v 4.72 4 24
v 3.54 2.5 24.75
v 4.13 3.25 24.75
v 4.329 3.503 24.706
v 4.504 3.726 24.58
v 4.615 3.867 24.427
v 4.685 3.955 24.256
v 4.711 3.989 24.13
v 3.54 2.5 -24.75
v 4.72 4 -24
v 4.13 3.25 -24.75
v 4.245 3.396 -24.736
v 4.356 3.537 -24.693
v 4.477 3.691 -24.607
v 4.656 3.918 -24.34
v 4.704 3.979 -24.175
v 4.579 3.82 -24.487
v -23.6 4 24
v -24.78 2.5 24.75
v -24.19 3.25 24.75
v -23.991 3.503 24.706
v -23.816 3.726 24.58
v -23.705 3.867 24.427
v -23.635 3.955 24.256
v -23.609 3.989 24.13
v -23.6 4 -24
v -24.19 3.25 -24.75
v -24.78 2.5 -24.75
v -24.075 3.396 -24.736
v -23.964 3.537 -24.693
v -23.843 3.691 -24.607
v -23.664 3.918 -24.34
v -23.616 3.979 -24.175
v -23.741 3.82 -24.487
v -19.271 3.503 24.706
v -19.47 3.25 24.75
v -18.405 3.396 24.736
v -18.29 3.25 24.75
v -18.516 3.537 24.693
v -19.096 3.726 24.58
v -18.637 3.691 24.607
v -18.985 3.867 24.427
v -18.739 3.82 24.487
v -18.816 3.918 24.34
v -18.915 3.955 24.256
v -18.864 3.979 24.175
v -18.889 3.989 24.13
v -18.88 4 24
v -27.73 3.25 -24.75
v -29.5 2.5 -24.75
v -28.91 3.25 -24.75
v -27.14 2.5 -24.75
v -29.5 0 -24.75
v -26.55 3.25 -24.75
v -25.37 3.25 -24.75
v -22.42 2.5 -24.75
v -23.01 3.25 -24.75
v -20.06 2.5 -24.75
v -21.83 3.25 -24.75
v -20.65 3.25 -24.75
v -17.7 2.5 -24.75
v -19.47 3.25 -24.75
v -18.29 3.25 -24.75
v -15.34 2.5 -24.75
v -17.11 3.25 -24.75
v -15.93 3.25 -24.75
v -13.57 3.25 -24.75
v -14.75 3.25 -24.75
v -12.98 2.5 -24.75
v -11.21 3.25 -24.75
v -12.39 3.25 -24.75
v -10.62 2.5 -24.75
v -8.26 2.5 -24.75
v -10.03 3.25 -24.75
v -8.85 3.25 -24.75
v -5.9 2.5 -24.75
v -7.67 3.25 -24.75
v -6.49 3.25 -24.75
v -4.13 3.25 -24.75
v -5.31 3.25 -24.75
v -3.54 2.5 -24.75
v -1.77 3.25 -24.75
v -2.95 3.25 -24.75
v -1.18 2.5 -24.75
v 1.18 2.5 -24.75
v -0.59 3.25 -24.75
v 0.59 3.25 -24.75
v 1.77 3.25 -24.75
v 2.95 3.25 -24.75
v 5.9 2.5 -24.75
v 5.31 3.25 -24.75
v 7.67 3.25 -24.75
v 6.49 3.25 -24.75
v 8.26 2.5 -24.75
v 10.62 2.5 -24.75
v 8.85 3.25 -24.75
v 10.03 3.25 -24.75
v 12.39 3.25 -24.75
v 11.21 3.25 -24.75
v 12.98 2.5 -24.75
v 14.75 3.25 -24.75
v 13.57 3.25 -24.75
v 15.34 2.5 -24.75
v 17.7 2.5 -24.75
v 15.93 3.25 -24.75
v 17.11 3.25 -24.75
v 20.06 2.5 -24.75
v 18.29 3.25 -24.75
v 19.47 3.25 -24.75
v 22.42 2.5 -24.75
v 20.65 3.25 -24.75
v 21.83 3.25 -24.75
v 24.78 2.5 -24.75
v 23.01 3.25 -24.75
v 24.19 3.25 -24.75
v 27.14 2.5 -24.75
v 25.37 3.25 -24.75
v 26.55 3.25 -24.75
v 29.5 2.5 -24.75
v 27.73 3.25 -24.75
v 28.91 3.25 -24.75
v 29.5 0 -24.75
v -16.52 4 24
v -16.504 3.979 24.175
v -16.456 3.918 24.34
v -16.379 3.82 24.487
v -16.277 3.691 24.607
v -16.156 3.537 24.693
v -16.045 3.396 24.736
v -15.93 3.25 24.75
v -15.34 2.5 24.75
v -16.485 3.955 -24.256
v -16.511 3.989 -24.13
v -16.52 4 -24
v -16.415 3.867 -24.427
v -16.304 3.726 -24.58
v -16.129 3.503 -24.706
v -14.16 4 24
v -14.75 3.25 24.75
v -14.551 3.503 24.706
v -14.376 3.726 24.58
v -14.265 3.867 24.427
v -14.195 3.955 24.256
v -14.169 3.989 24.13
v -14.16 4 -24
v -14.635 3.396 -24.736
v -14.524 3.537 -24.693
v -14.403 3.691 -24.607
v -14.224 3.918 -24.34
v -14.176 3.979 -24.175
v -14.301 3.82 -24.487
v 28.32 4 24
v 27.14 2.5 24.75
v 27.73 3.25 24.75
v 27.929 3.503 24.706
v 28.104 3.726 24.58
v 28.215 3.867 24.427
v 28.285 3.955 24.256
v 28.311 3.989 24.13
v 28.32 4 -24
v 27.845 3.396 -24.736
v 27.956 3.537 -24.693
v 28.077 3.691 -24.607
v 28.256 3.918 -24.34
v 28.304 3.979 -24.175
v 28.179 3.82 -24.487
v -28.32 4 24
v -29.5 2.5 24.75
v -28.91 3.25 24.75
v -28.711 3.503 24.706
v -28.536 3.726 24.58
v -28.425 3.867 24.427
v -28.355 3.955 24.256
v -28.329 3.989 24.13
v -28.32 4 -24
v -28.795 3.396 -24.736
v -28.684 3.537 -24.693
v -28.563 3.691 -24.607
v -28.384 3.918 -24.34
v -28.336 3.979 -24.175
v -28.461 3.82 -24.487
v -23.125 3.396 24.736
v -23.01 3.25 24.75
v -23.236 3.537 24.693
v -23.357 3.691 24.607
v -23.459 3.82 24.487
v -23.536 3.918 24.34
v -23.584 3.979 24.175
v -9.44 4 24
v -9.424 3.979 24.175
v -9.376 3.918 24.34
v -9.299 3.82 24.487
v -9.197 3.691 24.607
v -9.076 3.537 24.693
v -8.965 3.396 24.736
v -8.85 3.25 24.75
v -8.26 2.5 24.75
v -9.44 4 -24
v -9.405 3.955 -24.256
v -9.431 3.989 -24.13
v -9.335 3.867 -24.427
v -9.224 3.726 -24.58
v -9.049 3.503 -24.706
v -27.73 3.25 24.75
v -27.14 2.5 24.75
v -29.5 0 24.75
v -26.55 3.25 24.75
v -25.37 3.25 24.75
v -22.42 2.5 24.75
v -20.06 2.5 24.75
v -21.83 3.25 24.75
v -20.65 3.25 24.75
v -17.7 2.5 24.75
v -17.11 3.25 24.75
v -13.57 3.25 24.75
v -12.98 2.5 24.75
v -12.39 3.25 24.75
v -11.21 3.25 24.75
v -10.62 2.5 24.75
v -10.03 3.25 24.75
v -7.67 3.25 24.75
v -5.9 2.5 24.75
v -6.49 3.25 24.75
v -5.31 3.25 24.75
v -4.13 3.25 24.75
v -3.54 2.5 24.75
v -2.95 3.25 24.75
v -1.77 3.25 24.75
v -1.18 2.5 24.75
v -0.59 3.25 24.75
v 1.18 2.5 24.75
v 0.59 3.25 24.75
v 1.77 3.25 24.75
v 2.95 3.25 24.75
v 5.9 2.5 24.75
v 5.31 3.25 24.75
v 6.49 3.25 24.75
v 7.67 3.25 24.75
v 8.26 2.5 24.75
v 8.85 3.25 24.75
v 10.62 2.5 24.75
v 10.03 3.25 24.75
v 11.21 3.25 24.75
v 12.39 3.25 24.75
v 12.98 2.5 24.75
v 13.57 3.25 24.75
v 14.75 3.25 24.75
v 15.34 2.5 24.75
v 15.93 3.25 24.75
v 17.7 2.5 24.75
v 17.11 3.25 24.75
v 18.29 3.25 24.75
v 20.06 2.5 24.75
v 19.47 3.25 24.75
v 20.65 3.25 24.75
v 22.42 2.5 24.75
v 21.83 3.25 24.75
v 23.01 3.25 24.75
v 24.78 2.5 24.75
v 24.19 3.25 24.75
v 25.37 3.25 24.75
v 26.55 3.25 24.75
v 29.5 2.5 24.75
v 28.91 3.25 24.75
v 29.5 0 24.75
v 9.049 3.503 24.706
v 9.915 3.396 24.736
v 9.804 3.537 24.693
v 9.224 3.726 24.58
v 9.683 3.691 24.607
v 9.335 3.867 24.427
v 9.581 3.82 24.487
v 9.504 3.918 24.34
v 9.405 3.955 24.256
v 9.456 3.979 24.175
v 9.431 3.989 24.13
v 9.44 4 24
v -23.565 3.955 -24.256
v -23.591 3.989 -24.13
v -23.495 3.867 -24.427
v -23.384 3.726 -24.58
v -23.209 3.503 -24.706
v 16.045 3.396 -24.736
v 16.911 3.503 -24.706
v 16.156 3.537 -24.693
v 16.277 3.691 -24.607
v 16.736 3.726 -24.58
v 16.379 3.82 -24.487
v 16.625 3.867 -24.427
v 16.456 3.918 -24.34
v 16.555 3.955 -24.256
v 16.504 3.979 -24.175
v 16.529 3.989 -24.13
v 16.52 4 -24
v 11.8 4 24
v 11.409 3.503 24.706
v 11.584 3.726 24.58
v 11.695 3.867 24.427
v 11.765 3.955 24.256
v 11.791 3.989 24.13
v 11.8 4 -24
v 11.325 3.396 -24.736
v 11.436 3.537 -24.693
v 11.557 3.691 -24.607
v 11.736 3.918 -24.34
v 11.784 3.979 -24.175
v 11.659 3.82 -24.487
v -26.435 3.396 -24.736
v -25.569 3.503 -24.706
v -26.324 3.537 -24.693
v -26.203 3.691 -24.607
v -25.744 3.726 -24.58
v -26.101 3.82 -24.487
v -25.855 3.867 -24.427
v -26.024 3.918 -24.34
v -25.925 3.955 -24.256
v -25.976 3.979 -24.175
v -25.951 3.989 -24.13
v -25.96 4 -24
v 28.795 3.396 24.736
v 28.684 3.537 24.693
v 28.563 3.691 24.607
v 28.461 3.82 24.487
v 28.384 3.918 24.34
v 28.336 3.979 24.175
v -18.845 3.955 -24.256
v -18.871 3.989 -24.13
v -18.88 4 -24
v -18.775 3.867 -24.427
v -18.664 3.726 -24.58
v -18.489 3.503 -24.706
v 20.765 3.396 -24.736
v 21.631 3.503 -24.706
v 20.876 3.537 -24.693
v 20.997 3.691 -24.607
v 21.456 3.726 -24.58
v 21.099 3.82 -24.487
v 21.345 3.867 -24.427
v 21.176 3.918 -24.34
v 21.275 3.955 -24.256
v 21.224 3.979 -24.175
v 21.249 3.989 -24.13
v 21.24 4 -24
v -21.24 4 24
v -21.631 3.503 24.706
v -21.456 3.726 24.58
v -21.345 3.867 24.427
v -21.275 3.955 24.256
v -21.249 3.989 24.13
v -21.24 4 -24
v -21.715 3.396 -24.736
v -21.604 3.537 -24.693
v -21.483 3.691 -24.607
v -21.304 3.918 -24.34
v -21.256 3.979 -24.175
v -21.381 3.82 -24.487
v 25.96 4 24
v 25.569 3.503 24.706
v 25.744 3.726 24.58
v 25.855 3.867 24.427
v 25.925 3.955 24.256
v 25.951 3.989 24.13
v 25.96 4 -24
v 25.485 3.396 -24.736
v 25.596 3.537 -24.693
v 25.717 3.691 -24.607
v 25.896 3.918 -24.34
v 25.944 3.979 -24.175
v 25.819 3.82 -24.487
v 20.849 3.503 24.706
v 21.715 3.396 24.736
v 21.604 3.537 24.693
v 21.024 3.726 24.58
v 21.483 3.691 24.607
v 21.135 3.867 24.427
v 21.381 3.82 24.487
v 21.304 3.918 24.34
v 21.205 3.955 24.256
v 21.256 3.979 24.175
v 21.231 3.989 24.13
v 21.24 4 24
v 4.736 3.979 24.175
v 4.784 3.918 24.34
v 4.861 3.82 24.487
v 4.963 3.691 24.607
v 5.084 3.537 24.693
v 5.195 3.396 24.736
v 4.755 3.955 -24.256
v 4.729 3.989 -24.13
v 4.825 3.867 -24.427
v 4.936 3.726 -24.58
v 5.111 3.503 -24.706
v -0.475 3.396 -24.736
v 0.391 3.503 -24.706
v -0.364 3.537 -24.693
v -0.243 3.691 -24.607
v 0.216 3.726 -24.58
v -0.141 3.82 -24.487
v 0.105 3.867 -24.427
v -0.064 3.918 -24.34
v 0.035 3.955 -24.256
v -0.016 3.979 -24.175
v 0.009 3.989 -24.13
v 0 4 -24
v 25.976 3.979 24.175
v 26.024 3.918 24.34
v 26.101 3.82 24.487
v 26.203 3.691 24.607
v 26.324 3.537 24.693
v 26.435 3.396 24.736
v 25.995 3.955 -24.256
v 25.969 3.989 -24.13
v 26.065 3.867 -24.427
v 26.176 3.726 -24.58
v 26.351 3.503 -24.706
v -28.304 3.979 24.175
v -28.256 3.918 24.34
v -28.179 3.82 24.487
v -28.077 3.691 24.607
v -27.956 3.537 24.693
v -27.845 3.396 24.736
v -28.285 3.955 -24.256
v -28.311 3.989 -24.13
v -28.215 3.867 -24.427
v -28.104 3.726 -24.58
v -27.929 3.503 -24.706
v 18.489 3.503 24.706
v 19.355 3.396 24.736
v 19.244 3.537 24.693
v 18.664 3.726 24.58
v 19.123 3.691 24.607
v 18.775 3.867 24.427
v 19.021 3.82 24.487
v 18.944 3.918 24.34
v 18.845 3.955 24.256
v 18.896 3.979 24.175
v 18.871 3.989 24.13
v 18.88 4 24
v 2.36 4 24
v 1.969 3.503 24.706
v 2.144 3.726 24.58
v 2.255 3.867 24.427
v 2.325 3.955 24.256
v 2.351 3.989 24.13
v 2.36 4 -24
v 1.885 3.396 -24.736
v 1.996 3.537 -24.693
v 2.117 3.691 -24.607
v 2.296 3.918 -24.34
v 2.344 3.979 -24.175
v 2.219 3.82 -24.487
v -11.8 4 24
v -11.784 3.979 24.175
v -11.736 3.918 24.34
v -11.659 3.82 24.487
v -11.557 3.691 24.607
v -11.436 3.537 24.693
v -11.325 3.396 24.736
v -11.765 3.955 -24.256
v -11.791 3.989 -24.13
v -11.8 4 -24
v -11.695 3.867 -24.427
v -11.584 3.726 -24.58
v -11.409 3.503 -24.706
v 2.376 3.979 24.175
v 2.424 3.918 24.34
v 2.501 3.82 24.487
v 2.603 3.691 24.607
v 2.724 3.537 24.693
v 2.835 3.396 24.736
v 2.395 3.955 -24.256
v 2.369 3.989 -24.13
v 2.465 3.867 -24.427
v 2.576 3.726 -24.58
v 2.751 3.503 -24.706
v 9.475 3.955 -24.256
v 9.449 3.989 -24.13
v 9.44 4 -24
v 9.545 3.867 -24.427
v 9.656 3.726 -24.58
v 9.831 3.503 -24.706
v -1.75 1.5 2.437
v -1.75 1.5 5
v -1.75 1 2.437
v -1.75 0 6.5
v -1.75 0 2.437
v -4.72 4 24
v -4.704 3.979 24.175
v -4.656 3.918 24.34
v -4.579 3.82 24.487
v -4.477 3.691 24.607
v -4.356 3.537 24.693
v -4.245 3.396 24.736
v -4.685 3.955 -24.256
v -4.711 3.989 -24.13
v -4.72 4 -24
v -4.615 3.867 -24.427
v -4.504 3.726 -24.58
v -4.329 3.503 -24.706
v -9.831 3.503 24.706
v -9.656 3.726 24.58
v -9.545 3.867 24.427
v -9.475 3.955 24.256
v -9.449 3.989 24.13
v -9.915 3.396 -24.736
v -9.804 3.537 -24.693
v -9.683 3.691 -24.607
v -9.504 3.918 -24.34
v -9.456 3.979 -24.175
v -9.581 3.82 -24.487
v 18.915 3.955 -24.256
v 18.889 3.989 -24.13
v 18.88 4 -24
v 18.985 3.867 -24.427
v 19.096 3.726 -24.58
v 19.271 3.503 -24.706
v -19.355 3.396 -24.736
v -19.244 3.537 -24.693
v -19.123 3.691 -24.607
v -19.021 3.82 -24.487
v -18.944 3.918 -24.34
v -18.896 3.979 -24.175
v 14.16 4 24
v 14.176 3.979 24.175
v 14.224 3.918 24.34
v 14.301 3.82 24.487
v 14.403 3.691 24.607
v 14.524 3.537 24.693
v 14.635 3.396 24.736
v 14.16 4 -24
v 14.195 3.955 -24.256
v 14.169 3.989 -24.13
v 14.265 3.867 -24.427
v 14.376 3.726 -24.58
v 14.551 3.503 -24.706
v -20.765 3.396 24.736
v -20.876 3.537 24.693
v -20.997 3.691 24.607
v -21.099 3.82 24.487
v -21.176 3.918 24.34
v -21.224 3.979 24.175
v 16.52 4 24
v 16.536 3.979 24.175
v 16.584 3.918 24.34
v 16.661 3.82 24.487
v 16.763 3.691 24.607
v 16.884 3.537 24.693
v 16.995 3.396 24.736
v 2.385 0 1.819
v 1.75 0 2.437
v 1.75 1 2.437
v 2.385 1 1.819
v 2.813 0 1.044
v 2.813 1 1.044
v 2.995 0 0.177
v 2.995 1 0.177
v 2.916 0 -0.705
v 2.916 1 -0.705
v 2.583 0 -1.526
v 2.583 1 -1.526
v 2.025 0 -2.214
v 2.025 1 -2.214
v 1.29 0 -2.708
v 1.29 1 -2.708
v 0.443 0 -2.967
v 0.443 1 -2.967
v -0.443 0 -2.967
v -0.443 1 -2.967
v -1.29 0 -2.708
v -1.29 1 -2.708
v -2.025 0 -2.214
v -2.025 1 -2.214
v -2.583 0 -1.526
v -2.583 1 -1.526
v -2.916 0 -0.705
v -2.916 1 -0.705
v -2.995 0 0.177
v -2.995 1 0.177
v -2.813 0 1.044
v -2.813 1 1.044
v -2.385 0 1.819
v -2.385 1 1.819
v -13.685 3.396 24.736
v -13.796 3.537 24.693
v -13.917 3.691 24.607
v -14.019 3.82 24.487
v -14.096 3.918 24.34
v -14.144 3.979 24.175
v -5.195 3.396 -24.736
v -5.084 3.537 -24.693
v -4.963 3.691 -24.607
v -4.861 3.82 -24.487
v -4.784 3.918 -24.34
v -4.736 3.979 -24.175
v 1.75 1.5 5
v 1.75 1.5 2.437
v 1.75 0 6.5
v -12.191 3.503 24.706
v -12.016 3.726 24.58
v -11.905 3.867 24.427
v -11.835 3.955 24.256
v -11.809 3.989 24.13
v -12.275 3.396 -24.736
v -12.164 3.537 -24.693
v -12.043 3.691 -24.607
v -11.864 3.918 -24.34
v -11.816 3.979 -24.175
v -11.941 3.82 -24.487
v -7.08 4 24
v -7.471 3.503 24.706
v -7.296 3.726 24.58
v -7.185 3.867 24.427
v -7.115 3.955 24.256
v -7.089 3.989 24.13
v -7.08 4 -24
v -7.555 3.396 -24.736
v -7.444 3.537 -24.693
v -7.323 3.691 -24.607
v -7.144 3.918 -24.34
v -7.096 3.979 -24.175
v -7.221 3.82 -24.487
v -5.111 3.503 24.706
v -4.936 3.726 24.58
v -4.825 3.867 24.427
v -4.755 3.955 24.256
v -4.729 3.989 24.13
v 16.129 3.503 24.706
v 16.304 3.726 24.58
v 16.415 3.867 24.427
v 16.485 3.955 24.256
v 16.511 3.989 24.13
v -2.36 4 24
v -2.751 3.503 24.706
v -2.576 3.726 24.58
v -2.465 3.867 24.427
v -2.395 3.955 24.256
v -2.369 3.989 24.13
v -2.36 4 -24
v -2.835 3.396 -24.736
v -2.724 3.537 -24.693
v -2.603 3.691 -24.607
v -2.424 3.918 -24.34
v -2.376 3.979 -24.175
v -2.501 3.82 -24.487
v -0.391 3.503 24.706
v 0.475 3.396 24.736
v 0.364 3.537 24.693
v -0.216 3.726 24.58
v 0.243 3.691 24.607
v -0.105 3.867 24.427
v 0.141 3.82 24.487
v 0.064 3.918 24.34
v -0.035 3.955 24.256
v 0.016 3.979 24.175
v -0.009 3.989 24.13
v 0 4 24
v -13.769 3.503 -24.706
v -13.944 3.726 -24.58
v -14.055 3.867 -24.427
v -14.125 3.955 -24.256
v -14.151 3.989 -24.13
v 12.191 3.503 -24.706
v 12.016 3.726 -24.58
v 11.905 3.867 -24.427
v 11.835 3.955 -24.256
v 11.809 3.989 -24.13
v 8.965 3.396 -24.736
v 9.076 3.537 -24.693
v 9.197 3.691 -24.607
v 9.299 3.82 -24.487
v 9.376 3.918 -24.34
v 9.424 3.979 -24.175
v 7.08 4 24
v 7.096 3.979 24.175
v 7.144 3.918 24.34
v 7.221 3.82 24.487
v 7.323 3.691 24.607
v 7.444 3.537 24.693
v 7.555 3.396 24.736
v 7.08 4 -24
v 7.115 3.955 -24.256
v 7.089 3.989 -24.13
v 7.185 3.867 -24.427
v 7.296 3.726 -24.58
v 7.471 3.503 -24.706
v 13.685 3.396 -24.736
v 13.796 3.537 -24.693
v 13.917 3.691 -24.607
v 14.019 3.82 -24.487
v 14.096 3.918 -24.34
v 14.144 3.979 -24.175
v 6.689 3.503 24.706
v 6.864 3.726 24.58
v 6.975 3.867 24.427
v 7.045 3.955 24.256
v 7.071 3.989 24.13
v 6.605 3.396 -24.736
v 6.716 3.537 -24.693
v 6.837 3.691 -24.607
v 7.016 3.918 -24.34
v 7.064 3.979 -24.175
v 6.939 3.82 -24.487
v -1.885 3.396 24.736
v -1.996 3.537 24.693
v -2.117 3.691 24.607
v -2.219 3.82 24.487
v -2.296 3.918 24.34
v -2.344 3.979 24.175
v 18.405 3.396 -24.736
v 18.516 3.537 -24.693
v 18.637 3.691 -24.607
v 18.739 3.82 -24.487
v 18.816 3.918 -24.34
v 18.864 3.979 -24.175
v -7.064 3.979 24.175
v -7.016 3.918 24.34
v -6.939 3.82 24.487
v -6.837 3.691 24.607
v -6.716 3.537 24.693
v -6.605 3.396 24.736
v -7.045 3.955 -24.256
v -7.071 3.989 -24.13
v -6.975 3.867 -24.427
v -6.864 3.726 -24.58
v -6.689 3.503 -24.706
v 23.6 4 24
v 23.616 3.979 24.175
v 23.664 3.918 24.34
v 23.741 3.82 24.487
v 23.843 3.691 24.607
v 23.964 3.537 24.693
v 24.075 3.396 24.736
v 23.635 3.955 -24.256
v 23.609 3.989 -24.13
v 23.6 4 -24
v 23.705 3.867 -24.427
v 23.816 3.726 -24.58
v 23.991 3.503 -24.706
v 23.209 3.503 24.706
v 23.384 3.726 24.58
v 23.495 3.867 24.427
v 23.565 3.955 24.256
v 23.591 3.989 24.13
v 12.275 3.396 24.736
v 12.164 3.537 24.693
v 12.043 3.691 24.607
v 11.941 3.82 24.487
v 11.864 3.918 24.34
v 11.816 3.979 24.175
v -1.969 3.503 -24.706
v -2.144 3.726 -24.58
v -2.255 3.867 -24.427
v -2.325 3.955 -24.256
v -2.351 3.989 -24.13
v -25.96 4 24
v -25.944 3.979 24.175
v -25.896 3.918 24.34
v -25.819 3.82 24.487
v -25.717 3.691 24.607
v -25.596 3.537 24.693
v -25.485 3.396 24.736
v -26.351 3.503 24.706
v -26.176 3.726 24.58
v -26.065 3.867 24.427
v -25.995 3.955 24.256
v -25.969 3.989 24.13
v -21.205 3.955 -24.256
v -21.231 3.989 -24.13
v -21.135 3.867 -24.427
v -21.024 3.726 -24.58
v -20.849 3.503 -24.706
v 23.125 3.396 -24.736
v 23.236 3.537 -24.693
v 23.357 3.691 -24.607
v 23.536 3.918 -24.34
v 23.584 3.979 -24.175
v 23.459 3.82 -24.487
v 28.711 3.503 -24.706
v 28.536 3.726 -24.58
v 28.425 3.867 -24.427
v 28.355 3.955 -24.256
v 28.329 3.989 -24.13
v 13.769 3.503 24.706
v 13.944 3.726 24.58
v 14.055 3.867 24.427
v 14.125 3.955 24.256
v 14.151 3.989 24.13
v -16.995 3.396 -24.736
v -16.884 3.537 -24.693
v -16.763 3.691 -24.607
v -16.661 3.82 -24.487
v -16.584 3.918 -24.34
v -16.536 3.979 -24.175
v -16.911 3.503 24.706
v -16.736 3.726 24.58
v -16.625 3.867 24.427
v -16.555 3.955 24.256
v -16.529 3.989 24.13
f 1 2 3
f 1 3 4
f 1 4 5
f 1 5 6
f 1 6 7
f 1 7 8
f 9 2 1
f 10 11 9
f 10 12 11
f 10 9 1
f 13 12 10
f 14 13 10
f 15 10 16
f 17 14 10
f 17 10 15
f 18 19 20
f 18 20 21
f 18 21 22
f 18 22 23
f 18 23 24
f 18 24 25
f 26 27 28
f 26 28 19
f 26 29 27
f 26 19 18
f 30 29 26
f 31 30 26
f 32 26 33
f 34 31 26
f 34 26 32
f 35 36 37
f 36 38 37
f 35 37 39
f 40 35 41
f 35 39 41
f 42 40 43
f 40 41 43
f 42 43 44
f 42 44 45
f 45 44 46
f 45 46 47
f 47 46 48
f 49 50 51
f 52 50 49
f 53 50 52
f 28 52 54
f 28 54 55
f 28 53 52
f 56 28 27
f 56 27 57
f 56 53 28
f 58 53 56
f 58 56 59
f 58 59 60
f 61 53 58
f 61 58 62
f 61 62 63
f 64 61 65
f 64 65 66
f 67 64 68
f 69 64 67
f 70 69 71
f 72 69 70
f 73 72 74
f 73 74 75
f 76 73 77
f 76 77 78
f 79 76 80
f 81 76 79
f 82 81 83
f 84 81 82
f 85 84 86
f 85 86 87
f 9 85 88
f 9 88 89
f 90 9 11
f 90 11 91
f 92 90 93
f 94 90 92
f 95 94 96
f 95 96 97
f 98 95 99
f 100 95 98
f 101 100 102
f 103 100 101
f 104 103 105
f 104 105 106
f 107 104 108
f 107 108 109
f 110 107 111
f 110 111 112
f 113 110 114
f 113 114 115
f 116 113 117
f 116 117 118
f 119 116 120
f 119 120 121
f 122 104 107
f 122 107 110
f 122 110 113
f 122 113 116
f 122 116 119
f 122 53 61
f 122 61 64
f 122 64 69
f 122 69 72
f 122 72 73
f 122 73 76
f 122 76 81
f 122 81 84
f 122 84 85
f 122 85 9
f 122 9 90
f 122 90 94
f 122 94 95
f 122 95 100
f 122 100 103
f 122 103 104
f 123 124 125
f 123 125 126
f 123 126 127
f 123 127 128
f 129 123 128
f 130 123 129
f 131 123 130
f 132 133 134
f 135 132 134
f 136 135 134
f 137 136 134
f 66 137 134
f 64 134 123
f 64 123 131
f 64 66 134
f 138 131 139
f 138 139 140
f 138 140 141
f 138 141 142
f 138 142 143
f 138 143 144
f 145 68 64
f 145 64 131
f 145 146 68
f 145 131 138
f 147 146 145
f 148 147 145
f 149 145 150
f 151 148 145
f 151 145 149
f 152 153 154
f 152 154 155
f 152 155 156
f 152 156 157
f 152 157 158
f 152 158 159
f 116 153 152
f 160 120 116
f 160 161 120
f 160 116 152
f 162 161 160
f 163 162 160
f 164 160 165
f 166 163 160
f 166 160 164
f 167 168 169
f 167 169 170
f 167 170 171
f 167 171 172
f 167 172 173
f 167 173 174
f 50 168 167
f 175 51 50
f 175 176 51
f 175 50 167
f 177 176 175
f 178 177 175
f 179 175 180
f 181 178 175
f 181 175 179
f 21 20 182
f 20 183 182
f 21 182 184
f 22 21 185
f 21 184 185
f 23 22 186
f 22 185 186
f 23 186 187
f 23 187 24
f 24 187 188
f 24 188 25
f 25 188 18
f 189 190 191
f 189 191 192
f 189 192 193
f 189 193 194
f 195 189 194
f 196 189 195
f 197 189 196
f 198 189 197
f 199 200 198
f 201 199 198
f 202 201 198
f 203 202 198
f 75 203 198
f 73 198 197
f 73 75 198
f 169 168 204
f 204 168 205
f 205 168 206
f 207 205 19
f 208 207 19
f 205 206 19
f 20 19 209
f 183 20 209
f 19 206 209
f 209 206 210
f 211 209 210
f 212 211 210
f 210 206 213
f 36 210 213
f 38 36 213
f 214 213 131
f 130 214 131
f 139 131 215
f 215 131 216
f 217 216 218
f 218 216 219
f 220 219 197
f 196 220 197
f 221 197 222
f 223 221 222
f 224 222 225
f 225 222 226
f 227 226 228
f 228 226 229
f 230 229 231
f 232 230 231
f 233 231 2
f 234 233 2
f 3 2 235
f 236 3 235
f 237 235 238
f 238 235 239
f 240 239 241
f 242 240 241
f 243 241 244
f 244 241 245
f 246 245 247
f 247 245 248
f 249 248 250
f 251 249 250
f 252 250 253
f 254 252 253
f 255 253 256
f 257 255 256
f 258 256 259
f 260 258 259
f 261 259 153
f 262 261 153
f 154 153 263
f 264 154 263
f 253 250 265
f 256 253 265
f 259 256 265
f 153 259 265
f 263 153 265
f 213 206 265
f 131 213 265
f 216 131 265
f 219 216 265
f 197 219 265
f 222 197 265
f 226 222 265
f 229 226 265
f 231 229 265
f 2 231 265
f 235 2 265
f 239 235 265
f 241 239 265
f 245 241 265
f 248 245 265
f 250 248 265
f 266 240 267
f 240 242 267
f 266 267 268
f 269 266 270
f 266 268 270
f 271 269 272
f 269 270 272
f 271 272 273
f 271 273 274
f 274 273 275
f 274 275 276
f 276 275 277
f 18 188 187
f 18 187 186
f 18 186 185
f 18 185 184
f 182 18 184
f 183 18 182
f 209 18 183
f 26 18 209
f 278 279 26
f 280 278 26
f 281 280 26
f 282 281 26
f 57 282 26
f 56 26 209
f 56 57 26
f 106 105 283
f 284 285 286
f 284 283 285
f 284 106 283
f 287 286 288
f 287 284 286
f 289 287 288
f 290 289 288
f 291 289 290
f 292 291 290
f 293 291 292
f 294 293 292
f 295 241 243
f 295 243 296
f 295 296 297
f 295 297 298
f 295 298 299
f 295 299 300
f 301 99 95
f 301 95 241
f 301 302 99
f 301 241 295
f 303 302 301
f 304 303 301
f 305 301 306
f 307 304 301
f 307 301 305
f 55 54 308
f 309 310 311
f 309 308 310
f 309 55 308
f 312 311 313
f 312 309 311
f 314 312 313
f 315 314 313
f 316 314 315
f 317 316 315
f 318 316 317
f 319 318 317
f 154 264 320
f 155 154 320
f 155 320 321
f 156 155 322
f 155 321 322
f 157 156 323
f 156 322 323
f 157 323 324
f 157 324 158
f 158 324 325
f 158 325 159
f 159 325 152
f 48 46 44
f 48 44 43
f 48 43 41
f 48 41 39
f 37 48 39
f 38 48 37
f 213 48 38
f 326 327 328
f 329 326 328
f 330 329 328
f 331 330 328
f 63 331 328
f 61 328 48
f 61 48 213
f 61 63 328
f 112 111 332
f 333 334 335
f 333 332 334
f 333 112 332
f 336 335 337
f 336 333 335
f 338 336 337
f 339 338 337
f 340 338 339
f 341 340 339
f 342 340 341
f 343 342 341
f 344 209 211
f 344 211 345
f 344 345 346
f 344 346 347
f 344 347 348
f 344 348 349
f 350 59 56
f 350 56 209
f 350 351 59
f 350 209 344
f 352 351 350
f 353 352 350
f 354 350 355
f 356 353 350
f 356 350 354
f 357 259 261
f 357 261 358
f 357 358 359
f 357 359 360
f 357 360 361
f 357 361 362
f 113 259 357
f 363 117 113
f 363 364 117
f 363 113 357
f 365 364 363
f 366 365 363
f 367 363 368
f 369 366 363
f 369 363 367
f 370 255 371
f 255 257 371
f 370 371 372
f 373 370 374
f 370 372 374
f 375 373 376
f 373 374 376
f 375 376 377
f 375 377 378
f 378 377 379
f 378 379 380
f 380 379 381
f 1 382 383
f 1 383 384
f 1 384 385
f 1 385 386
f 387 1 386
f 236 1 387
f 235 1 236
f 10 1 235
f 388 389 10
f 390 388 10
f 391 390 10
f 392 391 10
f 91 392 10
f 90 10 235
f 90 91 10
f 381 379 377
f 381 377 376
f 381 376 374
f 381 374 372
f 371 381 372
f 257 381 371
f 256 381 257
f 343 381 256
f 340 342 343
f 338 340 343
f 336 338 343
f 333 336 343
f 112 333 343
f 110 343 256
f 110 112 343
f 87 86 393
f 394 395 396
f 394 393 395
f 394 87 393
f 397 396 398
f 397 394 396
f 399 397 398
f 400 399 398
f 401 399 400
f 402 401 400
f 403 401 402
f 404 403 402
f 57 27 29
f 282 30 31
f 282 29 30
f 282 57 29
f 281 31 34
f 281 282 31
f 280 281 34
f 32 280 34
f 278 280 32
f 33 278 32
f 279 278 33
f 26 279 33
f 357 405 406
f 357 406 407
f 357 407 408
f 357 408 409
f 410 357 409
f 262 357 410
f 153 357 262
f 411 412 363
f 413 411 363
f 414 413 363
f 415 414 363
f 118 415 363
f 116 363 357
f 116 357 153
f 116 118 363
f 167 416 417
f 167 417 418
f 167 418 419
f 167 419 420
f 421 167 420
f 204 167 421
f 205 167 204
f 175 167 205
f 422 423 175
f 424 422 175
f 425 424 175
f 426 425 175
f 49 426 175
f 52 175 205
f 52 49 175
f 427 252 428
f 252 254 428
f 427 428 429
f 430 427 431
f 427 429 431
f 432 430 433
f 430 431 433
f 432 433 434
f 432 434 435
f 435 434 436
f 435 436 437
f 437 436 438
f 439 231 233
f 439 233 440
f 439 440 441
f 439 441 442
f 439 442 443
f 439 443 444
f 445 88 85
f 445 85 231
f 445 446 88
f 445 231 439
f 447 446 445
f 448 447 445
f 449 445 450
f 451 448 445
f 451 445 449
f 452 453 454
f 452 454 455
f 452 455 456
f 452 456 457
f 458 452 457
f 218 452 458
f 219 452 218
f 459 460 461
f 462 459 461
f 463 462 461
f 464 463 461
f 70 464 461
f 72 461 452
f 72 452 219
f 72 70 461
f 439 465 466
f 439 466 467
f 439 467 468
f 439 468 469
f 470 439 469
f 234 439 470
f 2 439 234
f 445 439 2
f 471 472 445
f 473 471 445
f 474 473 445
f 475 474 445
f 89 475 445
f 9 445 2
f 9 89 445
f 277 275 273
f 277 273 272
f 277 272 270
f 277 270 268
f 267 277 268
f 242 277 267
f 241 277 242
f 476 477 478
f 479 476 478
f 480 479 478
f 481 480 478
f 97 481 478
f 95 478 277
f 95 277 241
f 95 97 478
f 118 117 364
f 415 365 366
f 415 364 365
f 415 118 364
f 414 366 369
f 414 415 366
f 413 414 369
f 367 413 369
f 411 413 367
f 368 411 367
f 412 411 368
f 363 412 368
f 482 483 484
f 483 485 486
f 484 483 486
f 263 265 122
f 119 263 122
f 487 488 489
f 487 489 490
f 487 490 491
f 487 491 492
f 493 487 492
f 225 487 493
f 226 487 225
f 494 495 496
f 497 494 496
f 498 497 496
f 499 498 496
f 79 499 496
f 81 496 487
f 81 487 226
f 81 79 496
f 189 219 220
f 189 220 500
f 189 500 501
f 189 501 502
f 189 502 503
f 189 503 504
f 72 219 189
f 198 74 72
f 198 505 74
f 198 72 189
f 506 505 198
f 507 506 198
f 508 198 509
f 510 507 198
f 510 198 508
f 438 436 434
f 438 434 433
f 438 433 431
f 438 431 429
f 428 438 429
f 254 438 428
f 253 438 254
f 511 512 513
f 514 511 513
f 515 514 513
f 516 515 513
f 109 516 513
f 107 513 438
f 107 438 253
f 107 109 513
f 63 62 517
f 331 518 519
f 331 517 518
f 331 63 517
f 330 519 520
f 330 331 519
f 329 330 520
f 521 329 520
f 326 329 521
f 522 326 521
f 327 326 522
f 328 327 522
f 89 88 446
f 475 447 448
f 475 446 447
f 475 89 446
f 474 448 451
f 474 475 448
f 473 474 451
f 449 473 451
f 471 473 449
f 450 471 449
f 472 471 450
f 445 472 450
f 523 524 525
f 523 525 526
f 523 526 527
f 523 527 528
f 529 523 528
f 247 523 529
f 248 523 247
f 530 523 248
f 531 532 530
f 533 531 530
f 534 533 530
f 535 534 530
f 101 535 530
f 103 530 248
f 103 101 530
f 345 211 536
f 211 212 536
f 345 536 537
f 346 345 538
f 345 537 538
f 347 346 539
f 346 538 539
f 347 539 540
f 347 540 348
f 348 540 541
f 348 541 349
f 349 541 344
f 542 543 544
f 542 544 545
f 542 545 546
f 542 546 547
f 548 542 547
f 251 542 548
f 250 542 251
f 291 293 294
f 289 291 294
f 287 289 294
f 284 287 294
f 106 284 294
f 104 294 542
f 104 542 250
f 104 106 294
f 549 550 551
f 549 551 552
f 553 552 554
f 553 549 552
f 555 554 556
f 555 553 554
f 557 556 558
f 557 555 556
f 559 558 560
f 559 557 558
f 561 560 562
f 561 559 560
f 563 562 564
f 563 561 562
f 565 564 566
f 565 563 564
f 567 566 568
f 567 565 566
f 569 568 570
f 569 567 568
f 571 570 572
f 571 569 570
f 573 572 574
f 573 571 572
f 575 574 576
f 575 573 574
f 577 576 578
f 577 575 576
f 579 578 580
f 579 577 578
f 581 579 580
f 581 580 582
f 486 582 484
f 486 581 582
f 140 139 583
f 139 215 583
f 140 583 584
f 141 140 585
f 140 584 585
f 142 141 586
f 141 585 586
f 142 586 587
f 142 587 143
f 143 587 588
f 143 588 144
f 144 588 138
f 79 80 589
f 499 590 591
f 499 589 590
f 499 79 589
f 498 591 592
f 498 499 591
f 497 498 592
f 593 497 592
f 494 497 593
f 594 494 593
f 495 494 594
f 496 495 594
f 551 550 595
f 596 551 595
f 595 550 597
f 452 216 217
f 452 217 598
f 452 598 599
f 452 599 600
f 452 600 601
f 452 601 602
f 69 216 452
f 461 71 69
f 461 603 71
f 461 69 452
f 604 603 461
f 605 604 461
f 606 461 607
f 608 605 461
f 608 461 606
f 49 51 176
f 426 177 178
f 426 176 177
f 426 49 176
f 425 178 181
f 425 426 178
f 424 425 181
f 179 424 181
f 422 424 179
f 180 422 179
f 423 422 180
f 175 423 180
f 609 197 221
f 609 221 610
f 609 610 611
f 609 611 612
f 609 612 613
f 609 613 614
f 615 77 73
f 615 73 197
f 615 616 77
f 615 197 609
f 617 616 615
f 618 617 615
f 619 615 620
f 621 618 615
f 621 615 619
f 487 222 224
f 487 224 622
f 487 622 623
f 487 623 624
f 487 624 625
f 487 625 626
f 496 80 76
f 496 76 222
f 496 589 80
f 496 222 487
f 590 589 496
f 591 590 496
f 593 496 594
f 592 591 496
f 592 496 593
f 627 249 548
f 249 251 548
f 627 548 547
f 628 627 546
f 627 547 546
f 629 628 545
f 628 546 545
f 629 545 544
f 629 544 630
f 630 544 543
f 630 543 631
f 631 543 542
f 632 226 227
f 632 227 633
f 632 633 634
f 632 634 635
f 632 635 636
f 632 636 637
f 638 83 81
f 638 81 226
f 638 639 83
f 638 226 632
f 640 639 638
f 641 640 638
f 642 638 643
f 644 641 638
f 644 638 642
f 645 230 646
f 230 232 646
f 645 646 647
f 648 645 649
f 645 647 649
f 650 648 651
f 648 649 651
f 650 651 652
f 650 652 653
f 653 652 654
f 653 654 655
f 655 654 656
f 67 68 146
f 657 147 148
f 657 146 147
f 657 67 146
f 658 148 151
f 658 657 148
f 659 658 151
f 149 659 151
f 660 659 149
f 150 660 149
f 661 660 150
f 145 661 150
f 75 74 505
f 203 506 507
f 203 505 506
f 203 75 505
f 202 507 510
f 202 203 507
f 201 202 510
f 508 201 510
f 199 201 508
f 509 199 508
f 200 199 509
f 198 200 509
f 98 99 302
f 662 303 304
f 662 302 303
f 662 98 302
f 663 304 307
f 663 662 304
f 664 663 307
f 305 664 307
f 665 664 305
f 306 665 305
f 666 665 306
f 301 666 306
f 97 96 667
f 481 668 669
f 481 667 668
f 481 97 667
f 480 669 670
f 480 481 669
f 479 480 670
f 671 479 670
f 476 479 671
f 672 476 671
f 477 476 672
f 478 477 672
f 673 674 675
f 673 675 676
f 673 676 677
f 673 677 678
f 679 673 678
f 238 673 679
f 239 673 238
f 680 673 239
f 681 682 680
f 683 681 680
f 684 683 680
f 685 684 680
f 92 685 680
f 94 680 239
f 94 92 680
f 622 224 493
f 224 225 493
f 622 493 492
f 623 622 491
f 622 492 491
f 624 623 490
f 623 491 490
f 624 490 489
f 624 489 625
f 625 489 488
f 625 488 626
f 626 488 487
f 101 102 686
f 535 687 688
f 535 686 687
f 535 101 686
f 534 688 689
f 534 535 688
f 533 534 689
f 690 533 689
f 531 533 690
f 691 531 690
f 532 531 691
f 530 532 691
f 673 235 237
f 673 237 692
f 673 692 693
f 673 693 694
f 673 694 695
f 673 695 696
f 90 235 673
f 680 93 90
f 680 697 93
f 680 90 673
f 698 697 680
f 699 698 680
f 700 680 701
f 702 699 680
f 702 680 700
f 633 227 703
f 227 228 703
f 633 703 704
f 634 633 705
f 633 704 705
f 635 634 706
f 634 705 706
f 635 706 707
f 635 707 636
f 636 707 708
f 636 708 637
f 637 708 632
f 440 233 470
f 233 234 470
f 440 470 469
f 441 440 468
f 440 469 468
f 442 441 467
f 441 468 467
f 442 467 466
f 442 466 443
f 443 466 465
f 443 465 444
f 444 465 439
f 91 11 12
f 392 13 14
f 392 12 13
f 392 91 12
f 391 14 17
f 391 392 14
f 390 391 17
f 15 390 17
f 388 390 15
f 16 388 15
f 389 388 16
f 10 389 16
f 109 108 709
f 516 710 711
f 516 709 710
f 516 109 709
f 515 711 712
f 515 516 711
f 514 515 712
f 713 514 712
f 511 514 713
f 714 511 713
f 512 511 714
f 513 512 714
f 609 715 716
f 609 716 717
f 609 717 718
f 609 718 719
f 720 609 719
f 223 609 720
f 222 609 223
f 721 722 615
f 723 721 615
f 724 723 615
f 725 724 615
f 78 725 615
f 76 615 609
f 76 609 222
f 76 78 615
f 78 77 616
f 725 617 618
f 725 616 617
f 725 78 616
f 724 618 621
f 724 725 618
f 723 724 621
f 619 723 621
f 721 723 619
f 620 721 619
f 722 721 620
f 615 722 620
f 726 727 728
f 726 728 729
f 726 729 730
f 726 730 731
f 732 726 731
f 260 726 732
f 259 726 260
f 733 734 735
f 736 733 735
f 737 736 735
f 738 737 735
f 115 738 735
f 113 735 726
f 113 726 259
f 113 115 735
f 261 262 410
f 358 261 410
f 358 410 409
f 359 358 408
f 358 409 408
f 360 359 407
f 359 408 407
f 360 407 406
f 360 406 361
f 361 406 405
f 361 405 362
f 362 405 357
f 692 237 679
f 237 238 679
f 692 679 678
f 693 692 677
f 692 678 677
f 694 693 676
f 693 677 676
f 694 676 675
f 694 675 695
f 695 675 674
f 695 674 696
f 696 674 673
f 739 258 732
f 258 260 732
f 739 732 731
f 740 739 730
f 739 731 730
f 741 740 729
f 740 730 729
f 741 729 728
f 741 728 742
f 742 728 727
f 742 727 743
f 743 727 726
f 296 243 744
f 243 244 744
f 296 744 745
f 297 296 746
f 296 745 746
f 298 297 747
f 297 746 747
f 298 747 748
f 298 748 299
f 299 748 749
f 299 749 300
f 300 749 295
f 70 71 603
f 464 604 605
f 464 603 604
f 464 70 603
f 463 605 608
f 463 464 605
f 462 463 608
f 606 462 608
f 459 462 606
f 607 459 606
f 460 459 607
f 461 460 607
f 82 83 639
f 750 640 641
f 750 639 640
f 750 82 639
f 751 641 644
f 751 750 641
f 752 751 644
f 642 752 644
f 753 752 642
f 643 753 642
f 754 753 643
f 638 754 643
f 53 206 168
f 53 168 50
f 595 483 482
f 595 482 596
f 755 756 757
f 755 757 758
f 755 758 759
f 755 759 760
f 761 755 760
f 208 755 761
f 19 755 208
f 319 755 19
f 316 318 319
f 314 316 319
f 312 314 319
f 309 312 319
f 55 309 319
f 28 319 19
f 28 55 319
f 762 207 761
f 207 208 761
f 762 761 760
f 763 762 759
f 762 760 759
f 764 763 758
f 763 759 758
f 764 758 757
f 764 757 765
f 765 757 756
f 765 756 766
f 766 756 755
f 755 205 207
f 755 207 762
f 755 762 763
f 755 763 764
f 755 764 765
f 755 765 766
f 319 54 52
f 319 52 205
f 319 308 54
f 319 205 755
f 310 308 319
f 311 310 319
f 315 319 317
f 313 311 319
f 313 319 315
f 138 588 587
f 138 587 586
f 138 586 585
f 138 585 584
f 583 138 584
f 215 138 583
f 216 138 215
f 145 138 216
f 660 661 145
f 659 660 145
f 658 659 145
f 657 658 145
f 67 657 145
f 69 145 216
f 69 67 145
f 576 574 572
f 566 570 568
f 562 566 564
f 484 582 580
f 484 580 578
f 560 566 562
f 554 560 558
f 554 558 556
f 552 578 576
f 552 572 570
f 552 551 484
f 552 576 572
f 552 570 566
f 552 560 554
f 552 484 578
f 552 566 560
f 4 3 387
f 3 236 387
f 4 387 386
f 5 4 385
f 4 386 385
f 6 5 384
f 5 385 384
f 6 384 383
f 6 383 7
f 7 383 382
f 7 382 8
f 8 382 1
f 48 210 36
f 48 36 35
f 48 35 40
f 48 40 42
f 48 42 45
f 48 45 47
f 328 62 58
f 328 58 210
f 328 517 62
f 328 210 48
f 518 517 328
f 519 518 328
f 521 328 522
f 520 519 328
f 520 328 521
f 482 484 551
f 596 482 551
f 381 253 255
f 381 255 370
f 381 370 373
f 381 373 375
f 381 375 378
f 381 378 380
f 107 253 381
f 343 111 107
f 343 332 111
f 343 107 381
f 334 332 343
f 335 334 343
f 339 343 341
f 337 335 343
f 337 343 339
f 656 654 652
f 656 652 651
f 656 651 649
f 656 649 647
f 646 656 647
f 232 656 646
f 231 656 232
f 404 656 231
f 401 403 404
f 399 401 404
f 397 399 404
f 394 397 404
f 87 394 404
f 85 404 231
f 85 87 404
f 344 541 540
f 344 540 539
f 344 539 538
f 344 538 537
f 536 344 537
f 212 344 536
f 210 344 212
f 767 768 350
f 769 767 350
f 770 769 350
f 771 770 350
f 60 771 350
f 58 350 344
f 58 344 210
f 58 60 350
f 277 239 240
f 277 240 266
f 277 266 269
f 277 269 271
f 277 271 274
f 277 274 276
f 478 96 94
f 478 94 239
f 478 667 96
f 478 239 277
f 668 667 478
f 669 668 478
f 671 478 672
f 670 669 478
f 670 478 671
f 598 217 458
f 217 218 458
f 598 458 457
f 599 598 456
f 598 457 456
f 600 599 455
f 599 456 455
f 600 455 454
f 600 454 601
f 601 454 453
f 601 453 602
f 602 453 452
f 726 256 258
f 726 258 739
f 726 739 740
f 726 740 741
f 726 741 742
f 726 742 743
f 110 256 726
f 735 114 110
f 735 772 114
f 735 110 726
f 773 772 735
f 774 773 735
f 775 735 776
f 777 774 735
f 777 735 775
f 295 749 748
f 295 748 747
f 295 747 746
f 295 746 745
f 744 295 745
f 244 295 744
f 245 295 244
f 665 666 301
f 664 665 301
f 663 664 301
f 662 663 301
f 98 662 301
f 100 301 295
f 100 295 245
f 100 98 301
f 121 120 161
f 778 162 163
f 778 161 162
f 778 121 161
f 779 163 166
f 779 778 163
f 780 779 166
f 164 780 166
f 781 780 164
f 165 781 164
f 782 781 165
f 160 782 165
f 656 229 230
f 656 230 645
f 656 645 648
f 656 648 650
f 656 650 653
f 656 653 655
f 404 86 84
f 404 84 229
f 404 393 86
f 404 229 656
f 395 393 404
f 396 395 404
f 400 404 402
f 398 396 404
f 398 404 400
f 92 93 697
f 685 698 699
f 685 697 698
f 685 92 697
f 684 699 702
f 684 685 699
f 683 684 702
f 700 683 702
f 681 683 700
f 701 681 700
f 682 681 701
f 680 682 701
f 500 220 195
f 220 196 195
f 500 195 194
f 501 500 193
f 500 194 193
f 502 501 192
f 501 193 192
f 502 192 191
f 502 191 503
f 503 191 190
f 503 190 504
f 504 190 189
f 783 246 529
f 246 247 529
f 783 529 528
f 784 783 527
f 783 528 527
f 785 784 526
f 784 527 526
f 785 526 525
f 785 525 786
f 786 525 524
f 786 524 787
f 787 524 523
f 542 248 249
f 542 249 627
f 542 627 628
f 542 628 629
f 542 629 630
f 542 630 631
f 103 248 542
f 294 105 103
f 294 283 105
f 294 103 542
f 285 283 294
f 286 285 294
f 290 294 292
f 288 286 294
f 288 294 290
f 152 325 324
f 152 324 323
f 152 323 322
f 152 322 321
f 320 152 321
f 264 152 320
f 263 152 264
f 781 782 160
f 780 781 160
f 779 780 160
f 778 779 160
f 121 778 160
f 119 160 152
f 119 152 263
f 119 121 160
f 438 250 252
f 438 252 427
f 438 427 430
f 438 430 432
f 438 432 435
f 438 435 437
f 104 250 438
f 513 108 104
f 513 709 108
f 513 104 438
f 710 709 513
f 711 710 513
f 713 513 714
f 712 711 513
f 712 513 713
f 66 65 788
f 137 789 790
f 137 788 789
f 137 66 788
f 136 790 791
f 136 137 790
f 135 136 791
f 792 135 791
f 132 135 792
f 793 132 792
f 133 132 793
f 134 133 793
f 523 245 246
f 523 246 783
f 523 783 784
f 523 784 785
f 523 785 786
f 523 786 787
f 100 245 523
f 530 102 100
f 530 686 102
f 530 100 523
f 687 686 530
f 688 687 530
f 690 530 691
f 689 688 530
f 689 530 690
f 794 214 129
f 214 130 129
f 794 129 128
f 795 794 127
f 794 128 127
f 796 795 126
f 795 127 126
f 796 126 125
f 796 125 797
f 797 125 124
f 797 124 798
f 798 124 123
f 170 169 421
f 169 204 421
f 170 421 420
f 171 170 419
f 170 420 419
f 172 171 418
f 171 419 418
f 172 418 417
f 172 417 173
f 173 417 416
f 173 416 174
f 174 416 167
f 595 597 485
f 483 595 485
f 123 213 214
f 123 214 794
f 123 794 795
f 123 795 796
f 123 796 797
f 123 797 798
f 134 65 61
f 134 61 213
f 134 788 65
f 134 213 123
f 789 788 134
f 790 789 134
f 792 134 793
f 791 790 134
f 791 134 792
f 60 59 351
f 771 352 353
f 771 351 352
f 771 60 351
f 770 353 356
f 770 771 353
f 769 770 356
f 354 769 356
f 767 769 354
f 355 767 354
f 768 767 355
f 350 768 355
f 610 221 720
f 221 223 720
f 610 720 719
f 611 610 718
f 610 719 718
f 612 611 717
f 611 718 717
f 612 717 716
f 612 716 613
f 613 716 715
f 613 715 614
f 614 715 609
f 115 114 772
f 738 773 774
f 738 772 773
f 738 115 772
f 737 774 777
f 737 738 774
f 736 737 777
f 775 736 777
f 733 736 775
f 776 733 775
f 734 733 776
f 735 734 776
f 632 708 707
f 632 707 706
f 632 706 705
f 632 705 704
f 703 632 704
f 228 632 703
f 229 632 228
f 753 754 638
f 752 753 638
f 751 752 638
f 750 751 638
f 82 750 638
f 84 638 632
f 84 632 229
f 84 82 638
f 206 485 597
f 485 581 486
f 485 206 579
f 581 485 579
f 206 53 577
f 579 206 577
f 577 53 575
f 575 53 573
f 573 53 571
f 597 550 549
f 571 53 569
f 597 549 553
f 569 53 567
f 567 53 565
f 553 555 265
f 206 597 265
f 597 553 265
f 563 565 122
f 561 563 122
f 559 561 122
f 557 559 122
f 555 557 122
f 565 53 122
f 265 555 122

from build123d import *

# Parameters (mm, degrees)
SKETCH1_W           = 59
SKETCH1_H           = 49.5
SKETCH1_R           = 3
BOSS_EXTRUDE1_DEPTH = 1.5
BOSS_EXTRUDE2_DEPTH = 49.5
CUT_EXTRUDE1_DEPTH  = 1
CUT_EXTRUDE3_DEPTH  = 65.105869466
BOSS_EXTRUDE3_START = 0.5
SKETCH5_R           = 3
BOSS_EXTRUDE3_DEPTH = 0.5
SKETCH6_W           = 3.5
SKETCH6_H           = 2.563301414
CUT_EXTRUDE4_DEPTH  = 0.5
CHAMFER3_SIZE       = 1.5


with BuildPart() as part:
    # Sketch1 → Boss-Extrude1 (new body)
    with BuildSketch(Plane(origin=(0, 0, 0), x_dir=(1, 0, 0), z_dir=(0, 1, 0))):
        Rectangle(SKETCH1_W, SKETCH1_H)
        with Locations(Location((0, 0, 0), (0, 0, 270))):
            Circle(SKETCH1_R, mode=Mode.SUBTRACT)
    extrude(amount=BOSS_EXTRUDE1_DEPTH)

    # Sketch2 → Boss-Extrude2 (add)
    with BuildSketch(Plane(origin=(0, 0, -24.75), x_dir=(-1, 0, 0), z_dir=(0, 0, -1))):
        Polygon((-29.5, 1.5), (29.5, 1.5), (29.5, 2.5), (28.32, 4), (27.14, 2.5), (25.96, 4), (24.78, 2.5), (23.6, 4), (22.42, 2.5), (21.24, 4), (20.06, 2.5), (18.88, 4), (17.7, 2.5), (16.52, 4), (15.34, 2.5), (14.16, 4), (12.98, 2.5), (11.8, 4), (10.62, 2.5), (9.44, 4), (8.26, 2.5), (7.08, 4), (5.9, 2.5), (4.72, 4), (3.54, 2.5), (2.36, 4), (1.18, 2.5), (0, 4), (-1.18, 2.5), (-2.36, 4), (-3.54, 2.5), (-4.72, 4), (-5.9, 2.5), (-7.08, 4), (-8.26, 2.5), (-9.44, 4), (-10.62, 2.5), (-11.8, 4), (-12.98, 2.5), (-14.16, 4), (-15.34, 2.5), (-16.52, 4), (-17.7, 2.5), (-18.88, 4), (-20.06, 2.5), (-21.24, 4), (-22.42, 2.5), (-23.6, 4), (-24.78, 2.5), (-25.96, 4), (-27.14, 2.5), (-28.32, 4), (-29.5, 2.5), align=None)
    extrude(amount=-BOSS_EXTRUDE2_DEPTH)

    # Sketch3 → Cut-Extrude1 (cut)
    with BuildSketch(Plane(origin=(0, 0, 0), x_dir=(-1, 0, 0), z_dir=(0, -1, 0))):
        with BuildLine():
            Line((-1.75, -2.436698586), (-1.75, -5))
            Line((-1.75, -5), (1.75, -5))
            Line((1.75, -5), (1.75, -2.436698586))
            ThreePointArc((1.75, -2.436698586), (0, 3), (-1.75, -2.436698586))
        make_face()
    extrude(amount=-CUT_EXTRUDE1_DEPTH, mode=Mode.SUBTRACT)

    # Sketch4 → Cut-Extrude3 (cut, through all)
    with BuildSketch(Plane(origin=(29.5, 0, 0), x_dir=(0, 0, -1), z_dir=(1, 0, 0))):
        with BuildLine():
            Line((-24, 4), (-24.75, 4))
            Line((-24.75, 4), (-24.75, 3.25))
            ThreePointArc((-24.75, 3.25), (-24.530330086, 3.780330086), (-24, 4))
        make_face()
    cut_extrude3 = extrude(amount=-CUT_EXTRUDE3_DEPTH, mode=Mode.SUBTRACT)

    # Mirror1: Cut-Extrude3 across plane
    add(cut_extrude3.mirror(Plane.XY), mode=Mode.SUBTRACT)

    # Sketch5 → Boss-Extrude3 (add)
    with BuildSketch(Plane.XZ.offset(-1.5).offset(BOSS_EXTRUDE3_START)):
        Circle(SKETCH5_R)
    extrude(amount=-BOSS_EXTRUDE3_DEPTH)

    # Sketch6 → Cut-Extrude4 (cut)
    with BuildSketch(Plane.XZ.offset(-1)):
        with Locations((0, 3.718349293)):
            Rectangle(SKETCH6_W, SKETCH6_H)
    extrude(amount=-CUT_EXTRUDE4_DEPTH, mode=Mode.SUBTRACT)

    # Chamfer3
    chamfer3_edges = [part.edges().sort_by_distance(p)[0] for p in [
        (0, 0, 5),
    ]]
    chamfer(chamfer3_edges, length=CHAMFER3_SIZE - 0.0001)  # a hair under: the kernel refuses the full size


solid = part.part
